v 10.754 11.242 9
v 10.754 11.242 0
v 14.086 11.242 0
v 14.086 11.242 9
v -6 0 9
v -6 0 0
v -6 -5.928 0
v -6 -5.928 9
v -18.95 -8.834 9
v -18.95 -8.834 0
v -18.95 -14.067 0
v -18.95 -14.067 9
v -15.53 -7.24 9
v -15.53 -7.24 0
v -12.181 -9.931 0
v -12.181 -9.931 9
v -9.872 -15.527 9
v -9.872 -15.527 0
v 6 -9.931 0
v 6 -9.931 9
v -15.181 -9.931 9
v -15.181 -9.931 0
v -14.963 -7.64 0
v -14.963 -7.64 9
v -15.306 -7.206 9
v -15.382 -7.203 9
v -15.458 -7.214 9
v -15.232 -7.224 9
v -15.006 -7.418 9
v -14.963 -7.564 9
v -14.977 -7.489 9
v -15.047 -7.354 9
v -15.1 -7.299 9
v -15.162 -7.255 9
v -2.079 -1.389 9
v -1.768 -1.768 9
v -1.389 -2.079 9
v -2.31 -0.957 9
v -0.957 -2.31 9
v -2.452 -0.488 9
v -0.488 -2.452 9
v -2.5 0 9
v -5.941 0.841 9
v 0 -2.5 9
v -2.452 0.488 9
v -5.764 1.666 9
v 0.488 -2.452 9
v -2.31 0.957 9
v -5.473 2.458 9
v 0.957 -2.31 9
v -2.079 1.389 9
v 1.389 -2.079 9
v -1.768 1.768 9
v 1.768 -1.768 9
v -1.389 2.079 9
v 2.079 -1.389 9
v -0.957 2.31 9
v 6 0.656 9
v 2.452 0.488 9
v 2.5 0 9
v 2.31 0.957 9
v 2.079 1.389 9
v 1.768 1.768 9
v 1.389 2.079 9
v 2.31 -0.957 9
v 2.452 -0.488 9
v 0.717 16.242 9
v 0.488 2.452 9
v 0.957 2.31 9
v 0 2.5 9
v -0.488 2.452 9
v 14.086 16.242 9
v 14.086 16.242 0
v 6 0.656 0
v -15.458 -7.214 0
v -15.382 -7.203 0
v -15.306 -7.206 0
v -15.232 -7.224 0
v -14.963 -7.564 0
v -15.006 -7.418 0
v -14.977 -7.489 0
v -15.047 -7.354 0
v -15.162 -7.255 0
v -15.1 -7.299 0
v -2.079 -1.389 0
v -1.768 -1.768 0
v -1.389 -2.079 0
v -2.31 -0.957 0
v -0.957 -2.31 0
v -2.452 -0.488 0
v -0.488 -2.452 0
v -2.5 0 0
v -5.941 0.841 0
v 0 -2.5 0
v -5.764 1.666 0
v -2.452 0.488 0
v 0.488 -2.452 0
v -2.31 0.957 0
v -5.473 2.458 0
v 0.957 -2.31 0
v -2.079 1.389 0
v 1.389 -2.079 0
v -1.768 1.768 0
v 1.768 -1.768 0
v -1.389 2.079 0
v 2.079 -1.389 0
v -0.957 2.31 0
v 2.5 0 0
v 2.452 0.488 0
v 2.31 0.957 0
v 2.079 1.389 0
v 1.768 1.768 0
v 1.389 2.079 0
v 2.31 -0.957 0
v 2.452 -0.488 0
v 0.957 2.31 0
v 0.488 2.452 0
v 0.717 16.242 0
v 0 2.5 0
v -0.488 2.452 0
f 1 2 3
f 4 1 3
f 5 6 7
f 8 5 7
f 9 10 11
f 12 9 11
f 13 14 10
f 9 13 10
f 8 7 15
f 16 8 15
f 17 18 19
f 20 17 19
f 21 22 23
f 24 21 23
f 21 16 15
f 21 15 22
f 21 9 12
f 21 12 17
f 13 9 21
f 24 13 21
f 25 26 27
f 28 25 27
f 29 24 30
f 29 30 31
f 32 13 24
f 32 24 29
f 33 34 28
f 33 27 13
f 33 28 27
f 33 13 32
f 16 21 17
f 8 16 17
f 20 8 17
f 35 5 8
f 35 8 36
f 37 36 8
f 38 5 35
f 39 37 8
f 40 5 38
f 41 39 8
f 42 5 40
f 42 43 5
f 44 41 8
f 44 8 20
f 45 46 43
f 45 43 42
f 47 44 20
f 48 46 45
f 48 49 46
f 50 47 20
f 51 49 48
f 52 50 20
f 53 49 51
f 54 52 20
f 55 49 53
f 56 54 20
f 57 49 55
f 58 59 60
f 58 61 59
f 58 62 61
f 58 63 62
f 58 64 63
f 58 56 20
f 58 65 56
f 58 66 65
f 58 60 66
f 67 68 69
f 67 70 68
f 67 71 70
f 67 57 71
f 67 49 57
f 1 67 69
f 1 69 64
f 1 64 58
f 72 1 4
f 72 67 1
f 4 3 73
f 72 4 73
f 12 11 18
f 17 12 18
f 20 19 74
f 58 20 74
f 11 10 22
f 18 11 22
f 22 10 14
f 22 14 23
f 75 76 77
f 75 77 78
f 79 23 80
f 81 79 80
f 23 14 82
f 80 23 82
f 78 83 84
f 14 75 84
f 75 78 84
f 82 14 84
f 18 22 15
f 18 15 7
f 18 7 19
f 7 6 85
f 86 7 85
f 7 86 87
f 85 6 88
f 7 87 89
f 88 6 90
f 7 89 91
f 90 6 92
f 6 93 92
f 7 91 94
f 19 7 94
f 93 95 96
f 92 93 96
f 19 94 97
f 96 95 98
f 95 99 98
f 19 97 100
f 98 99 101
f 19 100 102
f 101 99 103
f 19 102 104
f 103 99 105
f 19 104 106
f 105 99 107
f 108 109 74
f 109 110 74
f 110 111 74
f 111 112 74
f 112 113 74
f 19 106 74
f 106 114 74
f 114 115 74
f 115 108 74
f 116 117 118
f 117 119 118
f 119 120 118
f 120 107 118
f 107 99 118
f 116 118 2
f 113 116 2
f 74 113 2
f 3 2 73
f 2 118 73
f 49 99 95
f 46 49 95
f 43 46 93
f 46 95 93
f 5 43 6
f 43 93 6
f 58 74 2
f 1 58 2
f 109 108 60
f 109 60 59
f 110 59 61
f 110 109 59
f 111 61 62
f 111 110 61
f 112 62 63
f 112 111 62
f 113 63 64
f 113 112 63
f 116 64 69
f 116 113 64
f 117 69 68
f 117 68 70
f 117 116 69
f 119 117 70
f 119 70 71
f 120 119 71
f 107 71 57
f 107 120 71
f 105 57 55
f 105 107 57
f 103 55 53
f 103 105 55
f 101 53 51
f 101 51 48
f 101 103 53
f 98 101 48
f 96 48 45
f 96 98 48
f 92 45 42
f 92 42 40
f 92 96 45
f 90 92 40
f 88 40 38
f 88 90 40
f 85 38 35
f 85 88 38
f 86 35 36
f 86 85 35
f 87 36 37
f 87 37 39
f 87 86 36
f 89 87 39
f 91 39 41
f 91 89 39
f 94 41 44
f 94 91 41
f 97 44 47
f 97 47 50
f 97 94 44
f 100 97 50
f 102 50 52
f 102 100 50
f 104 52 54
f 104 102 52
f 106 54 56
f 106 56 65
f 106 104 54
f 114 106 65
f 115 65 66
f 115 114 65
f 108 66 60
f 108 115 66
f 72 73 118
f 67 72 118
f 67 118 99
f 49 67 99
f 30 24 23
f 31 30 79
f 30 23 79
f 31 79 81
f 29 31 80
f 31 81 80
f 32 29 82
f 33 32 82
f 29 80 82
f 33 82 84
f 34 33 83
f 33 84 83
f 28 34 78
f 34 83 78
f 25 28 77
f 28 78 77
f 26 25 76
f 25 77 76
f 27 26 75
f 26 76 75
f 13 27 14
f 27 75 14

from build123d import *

# Parameters (mm, degrees)
SKETCH_1_R      = 2.5
EXTRUDE_1_DEPTH = 9


with BuildPart() as part:
    # 스케치1 → 보스-돌출1 (new body)
    with BuildSketch(Plane.XY):
        with BuildLine():
            Line((-6, 0), (-6, -5.928252217))
            Line((-6, -5.928252217), (-12.181462163, -9.930872029))
            Line((-12.181462163, -9.930872029), (-15.181462163, -9.930872029))
            Line((-15.181462163, -9.930872029), (-14.962549322, -7.64046453))
            ThreePointArc((-14.962549322, -7.64046453), (-15.12996585, -7.275687064), (-15.529724639, -7.239856856))
            Line((-15.529724639, -7.239856856), (-18.949704861, -8.833960932))
            Line((-18.949704861, -8.833960932), (-18.949704861, -12.404351558))
            Line((-18.949704861, -12.404351558), (-18.949704861, -14.067418225))
            Line((-18.949704861, -14.067418225), (-9.871536241, -15.526817987))
            Line((-9.871536241, -15.526817987), (6, -9.930872029))
            Line((6, -9.930872029), (6, 0.655573526))
            Line((6, 0.655573526), (10.754294738, 11.24201908))
            Line((10.754294738, 11.24201908), (14.08643491, 11.24201908))
            Line((14.08643491, 11.24201908), (14.08643491, 16.24201908))
            Line((14.08643491, 16.24201908), (0.716889728, 16.24201908))
            Line((0.716889728, 16.24201908), (-5.473385983, 2.458057338))
            ThreePointArc((-5.473385983, 2.458057338), (-5.866869519, 1.256917678), (-6, 0))
        make_face()
        Circle(SKETCH_1_R, mode=Mode.SUBTRACT)
    extrude(amount=EXTRUDE_1_DEPTH)


solid = part.part
